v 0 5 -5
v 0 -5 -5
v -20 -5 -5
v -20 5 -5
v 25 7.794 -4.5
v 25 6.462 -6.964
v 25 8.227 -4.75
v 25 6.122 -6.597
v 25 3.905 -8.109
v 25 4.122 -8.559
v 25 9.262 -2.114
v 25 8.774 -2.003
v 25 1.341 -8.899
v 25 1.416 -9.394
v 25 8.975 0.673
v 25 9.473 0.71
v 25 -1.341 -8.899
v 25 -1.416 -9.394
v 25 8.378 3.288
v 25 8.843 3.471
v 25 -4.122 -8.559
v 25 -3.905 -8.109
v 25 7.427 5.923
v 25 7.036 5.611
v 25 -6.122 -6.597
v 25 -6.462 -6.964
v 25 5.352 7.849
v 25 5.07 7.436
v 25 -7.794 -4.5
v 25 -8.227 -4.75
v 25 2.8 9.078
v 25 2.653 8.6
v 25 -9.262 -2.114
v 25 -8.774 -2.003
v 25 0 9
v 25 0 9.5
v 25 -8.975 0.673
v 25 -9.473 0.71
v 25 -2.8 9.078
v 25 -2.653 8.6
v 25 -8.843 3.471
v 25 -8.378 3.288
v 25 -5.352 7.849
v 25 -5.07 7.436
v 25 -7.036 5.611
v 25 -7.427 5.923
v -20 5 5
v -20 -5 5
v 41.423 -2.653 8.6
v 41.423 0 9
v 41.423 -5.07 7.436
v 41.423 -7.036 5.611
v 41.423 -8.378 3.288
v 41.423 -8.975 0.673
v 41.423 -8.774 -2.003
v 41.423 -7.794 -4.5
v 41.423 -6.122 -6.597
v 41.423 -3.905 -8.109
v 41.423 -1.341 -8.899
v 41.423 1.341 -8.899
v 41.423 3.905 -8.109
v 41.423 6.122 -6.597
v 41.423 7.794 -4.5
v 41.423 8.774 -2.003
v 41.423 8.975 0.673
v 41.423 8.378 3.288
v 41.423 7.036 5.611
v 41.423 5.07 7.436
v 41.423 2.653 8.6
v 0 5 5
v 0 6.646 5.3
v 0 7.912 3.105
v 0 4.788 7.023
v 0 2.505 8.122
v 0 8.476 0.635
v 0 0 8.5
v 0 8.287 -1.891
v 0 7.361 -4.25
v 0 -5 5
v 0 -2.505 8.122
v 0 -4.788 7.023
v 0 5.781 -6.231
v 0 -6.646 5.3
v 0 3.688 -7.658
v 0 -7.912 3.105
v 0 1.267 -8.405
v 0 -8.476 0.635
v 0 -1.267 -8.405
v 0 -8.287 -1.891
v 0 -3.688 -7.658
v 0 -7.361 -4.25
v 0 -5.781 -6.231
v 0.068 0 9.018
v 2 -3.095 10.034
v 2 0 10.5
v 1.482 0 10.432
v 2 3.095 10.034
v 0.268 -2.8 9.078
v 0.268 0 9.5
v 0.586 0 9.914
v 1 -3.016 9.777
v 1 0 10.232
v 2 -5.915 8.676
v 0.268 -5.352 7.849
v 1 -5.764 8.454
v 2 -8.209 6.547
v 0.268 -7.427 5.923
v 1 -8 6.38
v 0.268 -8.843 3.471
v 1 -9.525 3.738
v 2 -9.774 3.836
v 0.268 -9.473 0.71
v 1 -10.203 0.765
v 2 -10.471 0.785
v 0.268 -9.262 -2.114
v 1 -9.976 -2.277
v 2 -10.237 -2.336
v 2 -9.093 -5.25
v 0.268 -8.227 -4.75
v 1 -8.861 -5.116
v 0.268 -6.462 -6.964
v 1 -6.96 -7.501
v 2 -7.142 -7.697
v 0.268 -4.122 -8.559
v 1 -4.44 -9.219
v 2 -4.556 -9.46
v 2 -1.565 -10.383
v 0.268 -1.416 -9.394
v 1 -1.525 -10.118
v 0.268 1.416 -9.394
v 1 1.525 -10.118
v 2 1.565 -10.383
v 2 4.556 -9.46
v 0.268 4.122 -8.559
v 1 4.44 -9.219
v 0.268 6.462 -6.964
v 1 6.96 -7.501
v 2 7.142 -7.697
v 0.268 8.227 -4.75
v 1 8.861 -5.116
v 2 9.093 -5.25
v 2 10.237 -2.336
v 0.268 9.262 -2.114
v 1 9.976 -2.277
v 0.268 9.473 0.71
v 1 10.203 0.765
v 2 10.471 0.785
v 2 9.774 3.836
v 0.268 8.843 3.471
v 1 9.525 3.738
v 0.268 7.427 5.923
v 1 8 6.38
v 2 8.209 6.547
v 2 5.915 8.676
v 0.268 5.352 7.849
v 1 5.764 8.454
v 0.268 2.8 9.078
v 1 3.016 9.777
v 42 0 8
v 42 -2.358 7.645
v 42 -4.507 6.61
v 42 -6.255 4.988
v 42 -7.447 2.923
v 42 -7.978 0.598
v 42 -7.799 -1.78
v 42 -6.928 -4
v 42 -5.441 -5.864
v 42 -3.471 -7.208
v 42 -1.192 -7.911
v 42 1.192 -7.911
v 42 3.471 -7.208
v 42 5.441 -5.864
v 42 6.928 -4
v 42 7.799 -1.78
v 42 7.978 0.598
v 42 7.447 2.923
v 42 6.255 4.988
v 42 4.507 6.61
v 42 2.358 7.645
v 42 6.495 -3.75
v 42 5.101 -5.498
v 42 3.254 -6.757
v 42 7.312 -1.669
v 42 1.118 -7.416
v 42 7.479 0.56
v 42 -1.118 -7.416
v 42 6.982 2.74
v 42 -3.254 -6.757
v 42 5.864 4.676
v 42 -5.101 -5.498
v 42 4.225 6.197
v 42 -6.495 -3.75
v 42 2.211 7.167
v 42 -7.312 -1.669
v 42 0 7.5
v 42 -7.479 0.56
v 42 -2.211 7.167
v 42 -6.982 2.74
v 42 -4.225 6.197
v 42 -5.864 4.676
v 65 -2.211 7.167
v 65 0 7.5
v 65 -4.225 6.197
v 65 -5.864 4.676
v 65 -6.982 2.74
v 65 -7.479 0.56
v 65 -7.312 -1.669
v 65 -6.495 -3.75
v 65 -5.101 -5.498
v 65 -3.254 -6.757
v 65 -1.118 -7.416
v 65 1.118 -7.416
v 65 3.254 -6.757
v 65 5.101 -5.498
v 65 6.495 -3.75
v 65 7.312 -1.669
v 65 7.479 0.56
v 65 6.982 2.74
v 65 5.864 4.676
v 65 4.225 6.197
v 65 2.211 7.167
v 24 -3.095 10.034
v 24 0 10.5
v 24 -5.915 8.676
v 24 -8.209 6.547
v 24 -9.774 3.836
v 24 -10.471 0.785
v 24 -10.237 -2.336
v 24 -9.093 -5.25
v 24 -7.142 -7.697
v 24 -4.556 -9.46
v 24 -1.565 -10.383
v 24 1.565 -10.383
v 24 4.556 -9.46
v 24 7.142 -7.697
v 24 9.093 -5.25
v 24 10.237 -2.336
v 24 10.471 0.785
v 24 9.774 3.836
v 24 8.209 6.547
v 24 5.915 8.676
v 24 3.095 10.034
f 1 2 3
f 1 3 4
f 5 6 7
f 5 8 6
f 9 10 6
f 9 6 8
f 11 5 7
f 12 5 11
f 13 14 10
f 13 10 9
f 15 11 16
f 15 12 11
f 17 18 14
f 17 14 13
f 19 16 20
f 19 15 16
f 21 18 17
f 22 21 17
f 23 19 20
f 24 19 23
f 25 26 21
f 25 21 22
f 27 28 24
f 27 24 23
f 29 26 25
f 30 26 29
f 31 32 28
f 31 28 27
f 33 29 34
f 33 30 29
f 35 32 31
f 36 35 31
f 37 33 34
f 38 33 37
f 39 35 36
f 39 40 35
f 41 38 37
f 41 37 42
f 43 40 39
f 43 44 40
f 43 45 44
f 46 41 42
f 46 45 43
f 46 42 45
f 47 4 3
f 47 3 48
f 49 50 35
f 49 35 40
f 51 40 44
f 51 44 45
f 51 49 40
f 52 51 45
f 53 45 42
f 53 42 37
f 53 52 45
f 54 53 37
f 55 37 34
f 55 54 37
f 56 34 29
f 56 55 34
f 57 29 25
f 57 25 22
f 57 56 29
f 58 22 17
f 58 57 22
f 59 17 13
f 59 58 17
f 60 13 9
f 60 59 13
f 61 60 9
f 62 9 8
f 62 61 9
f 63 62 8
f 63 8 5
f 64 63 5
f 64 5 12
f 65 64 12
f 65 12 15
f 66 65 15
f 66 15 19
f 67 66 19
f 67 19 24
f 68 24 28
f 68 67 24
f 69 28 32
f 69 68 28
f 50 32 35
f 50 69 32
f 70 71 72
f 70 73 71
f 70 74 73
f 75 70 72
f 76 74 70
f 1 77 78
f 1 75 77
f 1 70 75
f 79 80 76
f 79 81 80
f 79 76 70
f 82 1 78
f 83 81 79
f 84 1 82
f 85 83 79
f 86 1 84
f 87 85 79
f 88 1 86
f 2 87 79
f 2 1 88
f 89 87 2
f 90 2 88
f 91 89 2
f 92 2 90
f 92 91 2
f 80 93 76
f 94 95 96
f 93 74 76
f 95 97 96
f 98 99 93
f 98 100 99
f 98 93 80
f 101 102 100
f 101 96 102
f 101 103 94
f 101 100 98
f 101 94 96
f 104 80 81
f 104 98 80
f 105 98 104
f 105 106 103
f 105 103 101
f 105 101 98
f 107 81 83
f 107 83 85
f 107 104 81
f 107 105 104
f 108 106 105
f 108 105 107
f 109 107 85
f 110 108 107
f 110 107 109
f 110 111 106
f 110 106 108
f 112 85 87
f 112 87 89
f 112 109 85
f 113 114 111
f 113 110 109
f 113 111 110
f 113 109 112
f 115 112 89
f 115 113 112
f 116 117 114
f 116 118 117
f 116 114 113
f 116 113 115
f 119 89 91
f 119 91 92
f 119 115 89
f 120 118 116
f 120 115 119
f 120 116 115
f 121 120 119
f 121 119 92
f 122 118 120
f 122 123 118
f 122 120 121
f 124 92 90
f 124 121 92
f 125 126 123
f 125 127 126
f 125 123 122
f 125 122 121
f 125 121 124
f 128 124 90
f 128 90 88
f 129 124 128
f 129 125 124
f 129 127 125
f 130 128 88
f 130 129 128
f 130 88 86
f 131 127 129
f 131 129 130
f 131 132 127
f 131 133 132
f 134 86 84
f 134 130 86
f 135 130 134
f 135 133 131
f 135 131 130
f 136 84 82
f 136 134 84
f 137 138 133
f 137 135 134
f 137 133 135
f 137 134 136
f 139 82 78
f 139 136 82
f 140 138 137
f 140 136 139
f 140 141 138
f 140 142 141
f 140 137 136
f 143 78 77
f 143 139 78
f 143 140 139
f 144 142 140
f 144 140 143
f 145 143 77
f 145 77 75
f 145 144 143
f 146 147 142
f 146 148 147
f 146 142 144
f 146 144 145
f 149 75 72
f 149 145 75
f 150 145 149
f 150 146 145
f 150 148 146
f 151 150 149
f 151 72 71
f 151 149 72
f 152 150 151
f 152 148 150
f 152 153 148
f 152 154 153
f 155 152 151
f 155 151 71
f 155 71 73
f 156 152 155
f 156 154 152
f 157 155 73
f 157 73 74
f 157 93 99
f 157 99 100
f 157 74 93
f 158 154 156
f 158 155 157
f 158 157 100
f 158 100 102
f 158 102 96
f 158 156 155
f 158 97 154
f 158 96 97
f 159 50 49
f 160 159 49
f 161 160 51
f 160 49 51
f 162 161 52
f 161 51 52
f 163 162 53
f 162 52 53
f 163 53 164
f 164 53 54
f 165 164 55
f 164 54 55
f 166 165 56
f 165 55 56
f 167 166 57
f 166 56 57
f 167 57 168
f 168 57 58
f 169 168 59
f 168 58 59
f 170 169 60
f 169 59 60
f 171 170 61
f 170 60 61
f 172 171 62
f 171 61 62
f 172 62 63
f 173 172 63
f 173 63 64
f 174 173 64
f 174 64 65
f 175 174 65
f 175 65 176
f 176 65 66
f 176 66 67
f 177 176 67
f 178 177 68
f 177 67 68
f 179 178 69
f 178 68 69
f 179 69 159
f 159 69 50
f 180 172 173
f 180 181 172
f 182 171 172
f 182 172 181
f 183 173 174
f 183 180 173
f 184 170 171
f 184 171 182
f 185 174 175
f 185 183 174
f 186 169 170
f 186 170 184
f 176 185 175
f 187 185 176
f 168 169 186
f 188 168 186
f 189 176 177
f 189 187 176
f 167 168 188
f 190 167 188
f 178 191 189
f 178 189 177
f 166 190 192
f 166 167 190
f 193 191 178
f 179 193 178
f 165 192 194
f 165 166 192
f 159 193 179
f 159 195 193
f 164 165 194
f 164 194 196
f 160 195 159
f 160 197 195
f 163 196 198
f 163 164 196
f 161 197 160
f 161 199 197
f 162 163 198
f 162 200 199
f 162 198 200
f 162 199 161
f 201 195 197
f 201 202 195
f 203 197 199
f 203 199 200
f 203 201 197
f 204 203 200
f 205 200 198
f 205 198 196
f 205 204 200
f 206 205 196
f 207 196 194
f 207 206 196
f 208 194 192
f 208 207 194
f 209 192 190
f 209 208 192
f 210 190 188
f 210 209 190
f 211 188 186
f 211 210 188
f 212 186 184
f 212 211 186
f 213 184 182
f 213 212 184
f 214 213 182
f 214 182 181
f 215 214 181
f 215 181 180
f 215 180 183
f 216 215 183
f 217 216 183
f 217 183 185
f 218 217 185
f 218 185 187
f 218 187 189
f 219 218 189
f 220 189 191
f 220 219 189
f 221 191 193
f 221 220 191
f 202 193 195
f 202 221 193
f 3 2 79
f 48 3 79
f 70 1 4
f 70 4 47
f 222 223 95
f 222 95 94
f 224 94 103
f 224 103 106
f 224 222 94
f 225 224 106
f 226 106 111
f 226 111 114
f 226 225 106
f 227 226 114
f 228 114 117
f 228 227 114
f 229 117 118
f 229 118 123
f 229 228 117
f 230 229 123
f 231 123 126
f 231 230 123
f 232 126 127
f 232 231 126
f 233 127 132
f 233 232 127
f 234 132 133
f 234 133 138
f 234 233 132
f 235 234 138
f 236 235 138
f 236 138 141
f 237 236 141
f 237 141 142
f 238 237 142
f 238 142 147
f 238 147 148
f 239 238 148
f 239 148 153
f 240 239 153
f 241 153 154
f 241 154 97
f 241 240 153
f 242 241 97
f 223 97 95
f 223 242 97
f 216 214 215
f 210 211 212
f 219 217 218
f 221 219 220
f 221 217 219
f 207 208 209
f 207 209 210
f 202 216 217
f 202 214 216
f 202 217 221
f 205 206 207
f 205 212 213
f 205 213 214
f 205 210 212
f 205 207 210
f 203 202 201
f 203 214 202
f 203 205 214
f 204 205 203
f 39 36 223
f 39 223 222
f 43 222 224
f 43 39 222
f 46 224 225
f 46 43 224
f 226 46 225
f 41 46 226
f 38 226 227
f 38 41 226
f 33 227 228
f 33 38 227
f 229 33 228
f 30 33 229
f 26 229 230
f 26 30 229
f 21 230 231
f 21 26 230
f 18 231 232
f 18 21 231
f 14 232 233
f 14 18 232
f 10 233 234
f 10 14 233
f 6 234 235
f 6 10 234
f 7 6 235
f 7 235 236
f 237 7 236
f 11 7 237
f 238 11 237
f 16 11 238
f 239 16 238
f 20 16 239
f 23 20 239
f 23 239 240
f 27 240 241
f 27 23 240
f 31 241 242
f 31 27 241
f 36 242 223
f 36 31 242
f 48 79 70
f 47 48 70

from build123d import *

# Parameters (mm, degrees)
SKETCH_2_W      = 10
SKETCH_2_H      = 10
EXTRUDE_1_DEPTH = 20
FILLET_1_R      = 2
CHAMFER_1_SIZE  = 1
CHAMFER_2_SIZE  = 1
CHAMFER_2_SIZE2 = 0.577350269


with BuildPart() as part:
    # Эскиз1 → Повернуть1 (revolve)
    with BuildSketch(Plane.XY, mode=Mode.PRIVATE) as revolve_1_sk:
        Polygon((0, 0), (0, -10.5), (25, -10.5), (25, -9), (42, -9), (42, -7.5), (65, -7.5), (65, 0), align=None)
    revolve(revolve_1_sk.sketch.rotate(Axis((0, 0, 0), (1, 0, 0)), 270), axis=Axis((0, 0, 0), (1, 0, 0)))

    # Эскиз2 → Бобышка-Вытянуть1 (add)
    with BuildSketch(Plane.ZY):
        Rectangle(SKETCH_2_W, SKETCH_2_H)
    extrude(amount=EXTRUDE_1_DEPTH)

    # Скругление1
    fillet_1_edges = [part.edges().sort_by_distance(p)[0] for p in [
        (0, 0, -10.5),
    ]]
    fillet(fillet_1_edges, radius=FILLET_1_R)

    # Фаска1
    chamfer_1_edges = [part.edges().sort_by_distance(p)[0] for p in [
        (25, 0, -10.5),
    ]]
    chamfer(chamfer_1_edges, length=CHAMFER_1_SIZE)

    # Фаска2
    chamfer_2_edges = [part.edges().sort_by_distance(p)[0] for p in [
        (42, 0, -9),
    ]]
    chamfer_2_side = [part.faces().sort_by_distance(p)[0] for p in [
        (42, 0, -8.745441559),
    ]]
    chamfer(chamfer_2_edges, length=CHAMFER_2_SIZE, length2=CHAMFER_2_SIZE2, reference=chamfer_2_side[0])


solid = part.part
